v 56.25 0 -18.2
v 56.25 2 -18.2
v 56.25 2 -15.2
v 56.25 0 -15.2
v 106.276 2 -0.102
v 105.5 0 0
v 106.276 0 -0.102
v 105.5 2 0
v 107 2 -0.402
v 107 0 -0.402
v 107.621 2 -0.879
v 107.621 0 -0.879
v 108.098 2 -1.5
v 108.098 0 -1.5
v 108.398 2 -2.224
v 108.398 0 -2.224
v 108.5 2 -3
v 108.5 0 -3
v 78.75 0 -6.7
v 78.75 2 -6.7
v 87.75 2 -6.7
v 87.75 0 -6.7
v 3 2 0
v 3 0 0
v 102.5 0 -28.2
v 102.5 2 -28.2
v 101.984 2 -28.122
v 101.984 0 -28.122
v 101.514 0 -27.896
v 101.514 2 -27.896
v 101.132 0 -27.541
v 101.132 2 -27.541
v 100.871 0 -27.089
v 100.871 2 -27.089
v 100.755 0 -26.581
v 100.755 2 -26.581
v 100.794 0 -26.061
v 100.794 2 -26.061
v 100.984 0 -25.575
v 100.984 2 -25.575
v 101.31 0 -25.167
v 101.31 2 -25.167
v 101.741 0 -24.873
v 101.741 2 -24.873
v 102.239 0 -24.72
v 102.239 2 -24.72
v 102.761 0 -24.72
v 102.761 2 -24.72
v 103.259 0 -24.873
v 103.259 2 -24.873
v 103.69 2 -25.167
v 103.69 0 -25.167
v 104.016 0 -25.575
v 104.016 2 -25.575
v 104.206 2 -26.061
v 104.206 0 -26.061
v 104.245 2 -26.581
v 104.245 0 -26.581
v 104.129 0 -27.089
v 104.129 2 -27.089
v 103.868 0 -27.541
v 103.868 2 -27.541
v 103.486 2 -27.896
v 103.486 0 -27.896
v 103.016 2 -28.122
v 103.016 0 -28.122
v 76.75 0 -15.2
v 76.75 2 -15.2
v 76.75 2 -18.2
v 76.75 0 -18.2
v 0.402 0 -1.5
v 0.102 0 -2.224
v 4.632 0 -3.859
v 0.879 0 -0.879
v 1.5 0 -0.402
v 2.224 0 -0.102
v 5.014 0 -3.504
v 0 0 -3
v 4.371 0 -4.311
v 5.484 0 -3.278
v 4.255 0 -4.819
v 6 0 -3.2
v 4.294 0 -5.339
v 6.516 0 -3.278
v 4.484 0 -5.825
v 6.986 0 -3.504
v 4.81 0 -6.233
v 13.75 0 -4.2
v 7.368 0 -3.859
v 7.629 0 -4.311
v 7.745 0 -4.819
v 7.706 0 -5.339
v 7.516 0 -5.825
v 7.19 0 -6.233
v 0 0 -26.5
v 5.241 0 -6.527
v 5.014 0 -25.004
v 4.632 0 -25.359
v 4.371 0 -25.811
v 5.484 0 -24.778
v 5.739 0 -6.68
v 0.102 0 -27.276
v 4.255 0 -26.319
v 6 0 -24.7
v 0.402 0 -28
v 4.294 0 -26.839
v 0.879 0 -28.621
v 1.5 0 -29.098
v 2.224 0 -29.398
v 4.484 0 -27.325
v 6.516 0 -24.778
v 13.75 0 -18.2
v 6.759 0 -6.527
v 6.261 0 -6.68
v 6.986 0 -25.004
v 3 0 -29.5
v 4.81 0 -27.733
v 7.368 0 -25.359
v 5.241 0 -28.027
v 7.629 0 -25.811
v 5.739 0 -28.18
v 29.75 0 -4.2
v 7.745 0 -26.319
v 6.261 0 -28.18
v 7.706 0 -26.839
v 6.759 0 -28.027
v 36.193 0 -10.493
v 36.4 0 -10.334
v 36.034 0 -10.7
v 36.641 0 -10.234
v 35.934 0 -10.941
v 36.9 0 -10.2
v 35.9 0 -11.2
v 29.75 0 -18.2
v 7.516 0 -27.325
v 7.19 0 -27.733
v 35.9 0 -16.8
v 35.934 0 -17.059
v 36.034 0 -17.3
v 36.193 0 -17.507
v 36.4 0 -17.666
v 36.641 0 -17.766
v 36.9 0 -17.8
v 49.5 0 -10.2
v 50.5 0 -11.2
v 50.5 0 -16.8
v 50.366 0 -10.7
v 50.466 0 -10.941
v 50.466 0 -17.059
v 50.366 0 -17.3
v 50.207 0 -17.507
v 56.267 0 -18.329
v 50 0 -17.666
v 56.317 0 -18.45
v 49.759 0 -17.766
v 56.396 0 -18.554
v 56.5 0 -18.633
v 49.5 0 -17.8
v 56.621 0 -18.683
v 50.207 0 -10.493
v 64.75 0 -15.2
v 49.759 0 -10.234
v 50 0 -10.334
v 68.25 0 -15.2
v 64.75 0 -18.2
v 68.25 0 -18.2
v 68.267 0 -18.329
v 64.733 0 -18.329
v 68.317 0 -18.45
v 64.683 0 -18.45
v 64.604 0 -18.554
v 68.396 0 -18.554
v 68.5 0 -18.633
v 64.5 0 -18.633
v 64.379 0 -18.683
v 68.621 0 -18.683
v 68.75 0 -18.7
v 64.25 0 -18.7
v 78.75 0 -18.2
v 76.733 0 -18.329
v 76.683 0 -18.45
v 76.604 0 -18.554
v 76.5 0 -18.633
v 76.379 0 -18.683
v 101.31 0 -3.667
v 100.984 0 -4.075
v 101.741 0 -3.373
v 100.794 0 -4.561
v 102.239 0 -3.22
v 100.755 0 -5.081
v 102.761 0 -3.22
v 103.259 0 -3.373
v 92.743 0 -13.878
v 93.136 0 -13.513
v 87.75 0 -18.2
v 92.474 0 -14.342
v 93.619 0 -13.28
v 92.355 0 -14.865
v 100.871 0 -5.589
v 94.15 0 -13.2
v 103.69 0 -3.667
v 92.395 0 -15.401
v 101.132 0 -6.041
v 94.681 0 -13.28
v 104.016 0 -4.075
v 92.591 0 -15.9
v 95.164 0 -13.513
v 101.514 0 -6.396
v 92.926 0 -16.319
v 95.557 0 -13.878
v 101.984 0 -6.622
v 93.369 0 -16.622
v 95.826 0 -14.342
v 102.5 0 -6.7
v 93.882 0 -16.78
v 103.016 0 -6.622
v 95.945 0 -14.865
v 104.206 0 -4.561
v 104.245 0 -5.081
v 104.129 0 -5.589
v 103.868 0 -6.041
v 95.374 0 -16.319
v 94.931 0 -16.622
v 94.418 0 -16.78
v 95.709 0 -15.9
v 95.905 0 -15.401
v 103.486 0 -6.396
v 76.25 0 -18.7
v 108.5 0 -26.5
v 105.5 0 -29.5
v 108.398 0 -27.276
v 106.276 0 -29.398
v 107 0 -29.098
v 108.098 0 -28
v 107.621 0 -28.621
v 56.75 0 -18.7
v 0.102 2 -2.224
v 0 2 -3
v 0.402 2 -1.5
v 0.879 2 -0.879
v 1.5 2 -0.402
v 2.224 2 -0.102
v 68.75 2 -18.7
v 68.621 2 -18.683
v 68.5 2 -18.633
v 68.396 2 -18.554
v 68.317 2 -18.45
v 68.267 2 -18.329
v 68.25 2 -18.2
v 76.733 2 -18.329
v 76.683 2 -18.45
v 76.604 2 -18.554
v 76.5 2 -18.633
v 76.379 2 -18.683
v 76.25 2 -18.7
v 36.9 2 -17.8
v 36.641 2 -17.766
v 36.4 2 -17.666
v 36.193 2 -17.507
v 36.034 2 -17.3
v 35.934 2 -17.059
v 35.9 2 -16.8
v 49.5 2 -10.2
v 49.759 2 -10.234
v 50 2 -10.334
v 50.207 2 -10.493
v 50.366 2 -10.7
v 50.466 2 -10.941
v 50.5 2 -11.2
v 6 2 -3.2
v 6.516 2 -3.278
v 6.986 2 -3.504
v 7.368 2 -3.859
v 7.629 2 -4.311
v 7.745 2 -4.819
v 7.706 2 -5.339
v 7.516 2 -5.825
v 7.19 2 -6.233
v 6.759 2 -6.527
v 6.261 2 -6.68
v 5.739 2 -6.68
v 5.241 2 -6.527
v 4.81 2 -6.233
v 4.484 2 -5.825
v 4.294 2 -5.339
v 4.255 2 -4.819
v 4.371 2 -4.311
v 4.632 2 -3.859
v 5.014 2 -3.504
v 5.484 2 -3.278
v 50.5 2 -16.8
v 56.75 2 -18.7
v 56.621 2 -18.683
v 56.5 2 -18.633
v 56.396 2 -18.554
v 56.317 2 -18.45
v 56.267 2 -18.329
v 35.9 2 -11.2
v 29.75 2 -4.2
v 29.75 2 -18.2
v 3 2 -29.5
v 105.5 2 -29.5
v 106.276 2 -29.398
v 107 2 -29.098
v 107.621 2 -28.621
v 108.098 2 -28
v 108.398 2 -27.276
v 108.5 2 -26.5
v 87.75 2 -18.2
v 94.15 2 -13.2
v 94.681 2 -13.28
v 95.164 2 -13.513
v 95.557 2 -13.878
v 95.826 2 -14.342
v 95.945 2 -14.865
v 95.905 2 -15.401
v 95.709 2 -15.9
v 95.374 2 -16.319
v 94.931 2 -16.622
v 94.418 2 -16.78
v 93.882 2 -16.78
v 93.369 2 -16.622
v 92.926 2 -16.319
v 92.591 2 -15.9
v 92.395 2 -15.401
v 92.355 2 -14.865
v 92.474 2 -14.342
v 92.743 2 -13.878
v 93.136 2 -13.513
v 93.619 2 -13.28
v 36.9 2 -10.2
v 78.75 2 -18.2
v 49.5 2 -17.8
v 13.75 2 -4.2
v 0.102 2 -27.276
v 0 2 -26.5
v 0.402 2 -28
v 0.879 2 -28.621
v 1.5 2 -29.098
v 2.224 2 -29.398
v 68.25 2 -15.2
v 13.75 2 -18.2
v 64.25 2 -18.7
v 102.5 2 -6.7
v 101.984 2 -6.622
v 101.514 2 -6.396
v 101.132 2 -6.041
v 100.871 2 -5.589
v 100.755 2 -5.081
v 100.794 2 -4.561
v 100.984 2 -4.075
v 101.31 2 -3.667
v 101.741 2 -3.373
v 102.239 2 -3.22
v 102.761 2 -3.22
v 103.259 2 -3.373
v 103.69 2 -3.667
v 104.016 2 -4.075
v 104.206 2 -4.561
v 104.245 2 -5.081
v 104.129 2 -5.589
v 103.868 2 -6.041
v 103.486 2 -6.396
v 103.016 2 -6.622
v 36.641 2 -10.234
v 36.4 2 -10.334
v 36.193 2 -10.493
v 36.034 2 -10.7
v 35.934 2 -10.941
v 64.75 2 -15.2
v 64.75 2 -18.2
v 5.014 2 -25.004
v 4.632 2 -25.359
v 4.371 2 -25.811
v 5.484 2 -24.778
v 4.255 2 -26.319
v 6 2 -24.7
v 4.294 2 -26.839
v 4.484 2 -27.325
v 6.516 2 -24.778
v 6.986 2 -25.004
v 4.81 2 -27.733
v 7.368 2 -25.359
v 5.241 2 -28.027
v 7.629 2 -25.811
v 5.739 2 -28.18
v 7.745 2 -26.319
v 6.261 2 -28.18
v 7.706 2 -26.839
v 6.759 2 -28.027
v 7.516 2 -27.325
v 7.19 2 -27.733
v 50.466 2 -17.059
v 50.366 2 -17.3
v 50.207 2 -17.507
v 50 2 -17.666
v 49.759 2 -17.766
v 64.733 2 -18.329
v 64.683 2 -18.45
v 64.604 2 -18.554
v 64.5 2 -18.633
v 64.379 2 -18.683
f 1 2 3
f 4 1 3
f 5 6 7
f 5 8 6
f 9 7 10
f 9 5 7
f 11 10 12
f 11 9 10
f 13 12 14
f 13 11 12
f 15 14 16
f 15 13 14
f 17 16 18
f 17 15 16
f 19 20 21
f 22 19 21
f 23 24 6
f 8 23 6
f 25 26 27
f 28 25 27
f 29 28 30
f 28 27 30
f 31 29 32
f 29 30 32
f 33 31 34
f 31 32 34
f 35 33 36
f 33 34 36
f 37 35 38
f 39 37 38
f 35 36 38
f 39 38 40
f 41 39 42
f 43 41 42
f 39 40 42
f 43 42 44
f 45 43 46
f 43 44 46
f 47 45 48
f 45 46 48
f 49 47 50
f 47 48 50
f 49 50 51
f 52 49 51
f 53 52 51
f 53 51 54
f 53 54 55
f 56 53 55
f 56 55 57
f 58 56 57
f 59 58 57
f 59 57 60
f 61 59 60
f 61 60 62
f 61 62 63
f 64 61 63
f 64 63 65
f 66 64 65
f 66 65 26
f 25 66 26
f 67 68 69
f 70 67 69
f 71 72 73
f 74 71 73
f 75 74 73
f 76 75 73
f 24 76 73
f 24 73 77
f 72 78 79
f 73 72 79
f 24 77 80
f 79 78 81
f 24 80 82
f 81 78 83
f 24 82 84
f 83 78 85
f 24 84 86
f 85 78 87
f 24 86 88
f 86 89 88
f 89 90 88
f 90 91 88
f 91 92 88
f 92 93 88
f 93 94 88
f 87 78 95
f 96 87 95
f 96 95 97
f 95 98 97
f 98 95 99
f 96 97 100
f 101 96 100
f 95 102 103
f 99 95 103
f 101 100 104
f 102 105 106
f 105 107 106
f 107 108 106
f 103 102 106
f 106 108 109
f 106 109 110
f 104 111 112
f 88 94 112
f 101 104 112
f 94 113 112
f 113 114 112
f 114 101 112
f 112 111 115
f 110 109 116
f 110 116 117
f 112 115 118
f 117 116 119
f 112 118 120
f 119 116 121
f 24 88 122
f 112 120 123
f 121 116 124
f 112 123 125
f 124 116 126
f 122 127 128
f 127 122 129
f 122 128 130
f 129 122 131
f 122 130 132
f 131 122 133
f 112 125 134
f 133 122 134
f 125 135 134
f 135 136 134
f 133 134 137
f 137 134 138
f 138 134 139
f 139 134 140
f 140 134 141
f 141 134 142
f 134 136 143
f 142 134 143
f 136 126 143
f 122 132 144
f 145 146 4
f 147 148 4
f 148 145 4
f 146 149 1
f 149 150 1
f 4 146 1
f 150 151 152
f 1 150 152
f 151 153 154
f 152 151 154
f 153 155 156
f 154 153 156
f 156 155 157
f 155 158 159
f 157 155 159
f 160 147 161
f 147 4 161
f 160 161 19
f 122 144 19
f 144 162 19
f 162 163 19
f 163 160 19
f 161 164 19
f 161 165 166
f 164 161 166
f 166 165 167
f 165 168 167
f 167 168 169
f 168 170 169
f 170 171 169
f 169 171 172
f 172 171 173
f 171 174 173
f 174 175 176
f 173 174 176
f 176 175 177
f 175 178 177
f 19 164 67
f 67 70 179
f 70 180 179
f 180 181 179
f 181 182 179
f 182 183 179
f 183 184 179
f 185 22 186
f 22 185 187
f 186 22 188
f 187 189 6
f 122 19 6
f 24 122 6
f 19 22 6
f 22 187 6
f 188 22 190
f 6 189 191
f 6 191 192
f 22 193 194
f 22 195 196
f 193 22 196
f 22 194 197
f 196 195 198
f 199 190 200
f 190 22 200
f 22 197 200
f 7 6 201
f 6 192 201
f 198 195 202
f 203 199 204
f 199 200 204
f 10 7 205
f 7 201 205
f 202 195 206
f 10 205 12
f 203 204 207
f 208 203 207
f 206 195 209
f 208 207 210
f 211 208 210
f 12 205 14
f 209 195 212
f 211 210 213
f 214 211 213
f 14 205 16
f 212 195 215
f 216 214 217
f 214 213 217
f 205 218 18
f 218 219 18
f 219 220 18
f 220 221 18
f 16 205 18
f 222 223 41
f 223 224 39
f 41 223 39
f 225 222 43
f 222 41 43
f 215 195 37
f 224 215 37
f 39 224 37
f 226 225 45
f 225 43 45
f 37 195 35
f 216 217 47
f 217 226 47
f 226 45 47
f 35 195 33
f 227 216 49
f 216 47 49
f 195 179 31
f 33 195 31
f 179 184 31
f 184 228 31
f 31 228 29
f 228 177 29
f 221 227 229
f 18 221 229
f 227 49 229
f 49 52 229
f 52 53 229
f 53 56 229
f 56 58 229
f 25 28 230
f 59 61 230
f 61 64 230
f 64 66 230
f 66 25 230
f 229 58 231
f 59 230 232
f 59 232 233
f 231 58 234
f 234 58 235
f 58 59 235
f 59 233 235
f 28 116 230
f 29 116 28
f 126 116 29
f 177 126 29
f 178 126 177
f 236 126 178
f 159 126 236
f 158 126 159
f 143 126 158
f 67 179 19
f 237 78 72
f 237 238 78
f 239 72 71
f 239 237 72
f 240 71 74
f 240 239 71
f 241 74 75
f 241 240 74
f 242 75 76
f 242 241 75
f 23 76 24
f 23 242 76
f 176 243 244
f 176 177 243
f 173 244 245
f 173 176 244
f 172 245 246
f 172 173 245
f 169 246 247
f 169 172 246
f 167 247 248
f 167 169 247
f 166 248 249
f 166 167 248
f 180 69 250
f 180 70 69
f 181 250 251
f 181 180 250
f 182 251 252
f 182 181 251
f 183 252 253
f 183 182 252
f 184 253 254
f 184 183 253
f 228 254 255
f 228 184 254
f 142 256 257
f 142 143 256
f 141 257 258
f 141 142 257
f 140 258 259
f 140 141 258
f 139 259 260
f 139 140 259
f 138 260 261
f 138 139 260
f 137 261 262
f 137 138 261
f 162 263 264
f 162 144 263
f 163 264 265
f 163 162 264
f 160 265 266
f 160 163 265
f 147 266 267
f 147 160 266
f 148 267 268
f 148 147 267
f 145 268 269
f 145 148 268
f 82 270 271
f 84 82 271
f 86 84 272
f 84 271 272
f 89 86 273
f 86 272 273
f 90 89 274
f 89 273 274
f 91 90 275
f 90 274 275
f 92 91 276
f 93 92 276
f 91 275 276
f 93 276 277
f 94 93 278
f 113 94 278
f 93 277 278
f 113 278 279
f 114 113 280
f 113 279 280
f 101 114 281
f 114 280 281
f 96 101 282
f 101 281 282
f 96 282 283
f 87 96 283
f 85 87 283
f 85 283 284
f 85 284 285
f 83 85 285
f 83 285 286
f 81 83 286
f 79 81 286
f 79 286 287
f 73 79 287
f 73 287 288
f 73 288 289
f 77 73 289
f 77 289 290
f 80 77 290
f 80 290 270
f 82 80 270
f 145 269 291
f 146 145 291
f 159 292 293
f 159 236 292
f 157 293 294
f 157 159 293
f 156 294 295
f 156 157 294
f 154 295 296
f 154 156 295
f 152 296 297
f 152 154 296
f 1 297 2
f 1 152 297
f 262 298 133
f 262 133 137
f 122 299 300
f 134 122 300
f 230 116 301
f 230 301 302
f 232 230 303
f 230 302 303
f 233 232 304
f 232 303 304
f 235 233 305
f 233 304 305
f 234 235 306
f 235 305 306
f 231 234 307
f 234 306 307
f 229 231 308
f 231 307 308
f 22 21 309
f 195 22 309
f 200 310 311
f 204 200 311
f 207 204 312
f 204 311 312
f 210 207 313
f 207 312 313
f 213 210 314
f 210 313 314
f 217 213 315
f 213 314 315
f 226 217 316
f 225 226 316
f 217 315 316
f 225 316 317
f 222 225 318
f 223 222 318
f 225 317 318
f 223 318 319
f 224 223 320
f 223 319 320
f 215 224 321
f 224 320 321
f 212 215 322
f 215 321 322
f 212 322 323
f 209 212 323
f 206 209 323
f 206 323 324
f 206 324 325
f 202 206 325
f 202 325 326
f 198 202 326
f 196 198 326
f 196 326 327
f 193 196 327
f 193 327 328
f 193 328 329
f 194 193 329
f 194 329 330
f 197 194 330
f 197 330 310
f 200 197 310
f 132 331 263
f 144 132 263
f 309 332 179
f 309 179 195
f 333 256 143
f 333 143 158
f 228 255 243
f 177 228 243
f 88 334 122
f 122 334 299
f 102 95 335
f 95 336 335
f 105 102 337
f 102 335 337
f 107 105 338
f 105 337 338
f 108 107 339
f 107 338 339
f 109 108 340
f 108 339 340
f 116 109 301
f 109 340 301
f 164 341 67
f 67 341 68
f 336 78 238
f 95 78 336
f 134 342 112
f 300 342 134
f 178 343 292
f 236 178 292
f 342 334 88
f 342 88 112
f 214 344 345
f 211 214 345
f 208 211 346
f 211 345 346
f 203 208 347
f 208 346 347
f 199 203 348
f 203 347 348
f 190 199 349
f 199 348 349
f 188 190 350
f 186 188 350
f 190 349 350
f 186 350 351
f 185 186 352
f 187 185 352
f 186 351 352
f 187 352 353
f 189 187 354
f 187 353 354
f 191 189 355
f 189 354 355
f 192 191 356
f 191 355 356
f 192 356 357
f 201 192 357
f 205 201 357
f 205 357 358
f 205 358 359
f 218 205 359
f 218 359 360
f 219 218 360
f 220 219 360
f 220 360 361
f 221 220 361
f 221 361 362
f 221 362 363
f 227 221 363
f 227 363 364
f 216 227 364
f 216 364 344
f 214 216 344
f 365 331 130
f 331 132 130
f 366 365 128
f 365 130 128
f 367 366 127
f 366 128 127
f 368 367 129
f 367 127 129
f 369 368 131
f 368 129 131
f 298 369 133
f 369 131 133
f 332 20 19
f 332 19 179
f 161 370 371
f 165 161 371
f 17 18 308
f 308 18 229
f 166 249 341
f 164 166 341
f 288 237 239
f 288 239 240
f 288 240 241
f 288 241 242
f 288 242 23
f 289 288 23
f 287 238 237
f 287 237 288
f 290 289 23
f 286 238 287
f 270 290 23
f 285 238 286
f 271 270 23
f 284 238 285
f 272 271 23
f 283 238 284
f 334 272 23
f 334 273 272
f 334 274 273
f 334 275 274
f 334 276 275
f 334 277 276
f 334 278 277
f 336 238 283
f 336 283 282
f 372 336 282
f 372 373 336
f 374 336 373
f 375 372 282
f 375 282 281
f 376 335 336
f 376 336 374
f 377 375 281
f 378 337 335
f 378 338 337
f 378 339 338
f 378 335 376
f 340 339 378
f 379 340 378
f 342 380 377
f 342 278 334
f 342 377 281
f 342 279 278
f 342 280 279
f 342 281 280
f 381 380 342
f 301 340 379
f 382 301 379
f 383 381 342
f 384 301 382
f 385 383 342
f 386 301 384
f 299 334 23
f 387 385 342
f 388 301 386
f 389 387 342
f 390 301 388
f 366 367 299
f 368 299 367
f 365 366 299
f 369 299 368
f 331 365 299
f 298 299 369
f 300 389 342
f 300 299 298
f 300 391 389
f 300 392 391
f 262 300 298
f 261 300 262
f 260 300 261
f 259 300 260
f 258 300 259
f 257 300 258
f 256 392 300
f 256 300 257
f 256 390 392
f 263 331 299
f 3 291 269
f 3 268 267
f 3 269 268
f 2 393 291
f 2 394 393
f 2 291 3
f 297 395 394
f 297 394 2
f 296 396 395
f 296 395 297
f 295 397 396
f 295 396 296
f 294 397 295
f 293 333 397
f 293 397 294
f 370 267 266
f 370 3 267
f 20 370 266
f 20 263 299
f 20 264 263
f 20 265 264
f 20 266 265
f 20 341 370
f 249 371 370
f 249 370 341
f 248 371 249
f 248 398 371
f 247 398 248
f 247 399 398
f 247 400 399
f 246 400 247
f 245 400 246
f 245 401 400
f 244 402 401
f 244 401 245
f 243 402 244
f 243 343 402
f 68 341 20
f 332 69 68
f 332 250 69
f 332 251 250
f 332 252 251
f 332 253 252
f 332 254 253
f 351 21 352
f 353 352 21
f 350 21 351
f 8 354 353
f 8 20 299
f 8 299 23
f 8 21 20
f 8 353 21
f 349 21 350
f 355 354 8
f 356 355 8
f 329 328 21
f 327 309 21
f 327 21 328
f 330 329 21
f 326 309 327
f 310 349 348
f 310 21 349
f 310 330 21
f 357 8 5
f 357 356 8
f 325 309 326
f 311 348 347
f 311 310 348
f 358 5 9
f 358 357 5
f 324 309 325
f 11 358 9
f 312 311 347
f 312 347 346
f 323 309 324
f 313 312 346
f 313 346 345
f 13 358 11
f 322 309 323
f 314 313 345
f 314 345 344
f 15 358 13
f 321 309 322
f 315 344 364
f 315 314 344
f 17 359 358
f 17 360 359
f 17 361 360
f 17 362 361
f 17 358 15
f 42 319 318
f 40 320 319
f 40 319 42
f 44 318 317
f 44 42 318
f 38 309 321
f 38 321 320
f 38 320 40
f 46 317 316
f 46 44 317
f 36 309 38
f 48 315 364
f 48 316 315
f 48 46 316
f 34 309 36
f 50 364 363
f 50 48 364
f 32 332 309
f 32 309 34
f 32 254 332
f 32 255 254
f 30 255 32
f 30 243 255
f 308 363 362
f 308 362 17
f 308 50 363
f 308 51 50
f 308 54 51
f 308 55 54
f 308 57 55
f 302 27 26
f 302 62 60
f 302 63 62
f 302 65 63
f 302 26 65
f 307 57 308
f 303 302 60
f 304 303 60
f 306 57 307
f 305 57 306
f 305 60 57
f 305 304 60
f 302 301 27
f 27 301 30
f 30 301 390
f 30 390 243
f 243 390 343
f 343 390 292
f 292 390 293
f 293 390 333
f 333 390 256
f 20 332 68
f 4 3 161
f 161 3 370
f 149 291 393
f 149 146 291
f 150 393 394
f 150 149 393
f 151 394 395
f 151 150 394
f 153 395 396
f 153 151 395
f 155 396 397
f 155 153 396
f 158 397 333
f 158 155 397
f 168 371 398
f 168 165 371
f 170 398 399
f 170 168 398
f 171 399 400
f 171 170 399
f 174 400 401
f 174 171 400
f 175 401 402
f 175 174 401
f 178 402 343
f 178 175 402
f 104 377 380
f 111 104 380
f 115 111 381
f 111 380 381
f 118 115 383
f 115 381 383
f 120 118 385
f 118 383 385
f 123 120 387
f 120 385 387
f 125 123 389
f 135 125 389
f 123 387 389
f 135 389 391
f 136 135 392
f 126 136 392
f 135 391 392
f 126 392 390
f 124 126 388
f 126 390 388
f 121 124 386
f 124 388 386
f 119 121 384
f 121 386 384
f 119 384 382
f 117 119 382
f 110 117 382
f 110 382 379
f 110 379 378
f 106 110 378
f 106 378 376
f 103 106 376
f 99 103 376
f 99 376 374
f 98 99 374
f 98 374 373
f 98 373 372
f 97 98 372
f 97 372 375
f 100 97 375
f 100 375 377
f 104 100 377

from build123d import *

# Parameters (mm, degrees)
SKETCH1_W           = 108.5
SKETCH1_H           = 29.5
BOSS_EXTRUDE1_DEPTH = 2
SKETCH2_R           = 1.75
CUT_EXTRUDE1_DEPTH  = 113.456658318
FILLET1_R           = 3
SKETCH5_R           = 1.8
SKETCH5_W           = 16
SKETCH5_H           = 14
SKETCH5_W_2         = 14.6
SKETCH5_H_2         = 7.6
SKETCH5_W_3         = 9
SKETCH5_H_3         = 11.5
CUT_EXTRUDE2_DEPTH  = 113.456658318
FILLET2_R           = 1
FILLET3_R           = 0.5


with BuildPart() as part:
    # Sketch1 → Boss-Extrude1 (new body)
    with BuildSketch(Plane(origin=(0, 0, 0), x_dir=(1, 0, 0), z_dir=(0, 1, 0))):
        with Locations((54.25, 14.75)):
            Rectangle(SKETCH1_W, SKETCH1_H)
    extrude(amount=BOSS_EXTRUDE1_DEPTH)

    # Sketch2 → Cut-Extrude1 (cut, through all)
    with BuildSketch(Plane(origin=(0, 2, 0), x_dir=(1, 0, 0), z_dir=(0, 1, 0))):
        with Locations(Location((6, 26.45, 0), (0, 0, 270))):
            Circle(SKETCH2_R)
        with Locations(Location((6, 4.95, 0), (0, 0, 270))):
            Circle(SKETCH2_R)
        with Locations(Location((102.5, 4.95, 0), (0, 0, 90))):
            Circle(SKETCH2_R)
        with Locations(Location((102.5, 26.45, 0), (0, 0, 90))):
            Circle(SKETCH2_R)
    extrude(amount=-CUT_EXTRUDE1_DEPTH, mode=Mode.SUBTRACT)

    # Fillet1
    fillet1_edges = [part.edges().sort_by_distance(p)[0] for p in [
        (0, 1, -29.5),
        (108.5, 1, -29.5),
        (108.5, 1, 0),
        (0, 1, 0),
    ]]
    fillet(fillet1_edges, radius=FILLET1_R)

    # Sketch5 → Cut-Extrude2 (cut, through all)
    with BuildSketch(Plane(origin=(0, 2, 0), x_dir=(1, 0, 0), z_dir=(0, 1, 0))):
        with Locations(Location((94.15, 15, 0), (0, 0, 270))):
            Circle(SKETCH5_R)
        with Locations((21.75, 11.2)):
            Rectangle(SKETCH5_W, SKETCH5_H)
        with Locations((43.2, 14)):
            Rectangle(SKETCH5_W_2, SKETCH5_H_2)
        Polygon((56.25, 18.2), (56.25, 15.2), (64.75, 15.2), (64.75, 18.2), (64.75, 18.7), (56.25, 18.7), align=None)
        Polygon((68.25, 18.2), (68.25, 15.2), (76.75, 15.2), (76.75, 18.2), (76.75, 18.7), (68.25, 18.7), align=None)
        with Locations((83.25, 12.45)):
            Rectangle(SKETCH5_W_3, SKETCH5_H_3)
    extrude(amount=-CUT_EXTRUDE2_DEPTH, mode=Mode.SUBTRACT)

    # Fillet2
    fillet2_edges = [part.edges().sort_by_distance(p)[0] for p in [
        (50.5, 1, -10.2),
        (35.9, 1, -10.2),
        (35.9, 1, -17.8),
        (50.5, 1, -17.8),
    ]]
    fillet(fillet2_edges, radius=FILLET2_R)

    # Fillet3
    fillet3_edges = [part.edges().sort_by_distance(p)[0] for p in [
        (56.25, 1, -18.7),
        (64.75, 1, -18.7),
        (68.25, 1, -18.7),
        (76.75, 1, -18.7),
    ]]
    fillet(fillet3_edges, radius=FILLET3_R)


solid = part.part
